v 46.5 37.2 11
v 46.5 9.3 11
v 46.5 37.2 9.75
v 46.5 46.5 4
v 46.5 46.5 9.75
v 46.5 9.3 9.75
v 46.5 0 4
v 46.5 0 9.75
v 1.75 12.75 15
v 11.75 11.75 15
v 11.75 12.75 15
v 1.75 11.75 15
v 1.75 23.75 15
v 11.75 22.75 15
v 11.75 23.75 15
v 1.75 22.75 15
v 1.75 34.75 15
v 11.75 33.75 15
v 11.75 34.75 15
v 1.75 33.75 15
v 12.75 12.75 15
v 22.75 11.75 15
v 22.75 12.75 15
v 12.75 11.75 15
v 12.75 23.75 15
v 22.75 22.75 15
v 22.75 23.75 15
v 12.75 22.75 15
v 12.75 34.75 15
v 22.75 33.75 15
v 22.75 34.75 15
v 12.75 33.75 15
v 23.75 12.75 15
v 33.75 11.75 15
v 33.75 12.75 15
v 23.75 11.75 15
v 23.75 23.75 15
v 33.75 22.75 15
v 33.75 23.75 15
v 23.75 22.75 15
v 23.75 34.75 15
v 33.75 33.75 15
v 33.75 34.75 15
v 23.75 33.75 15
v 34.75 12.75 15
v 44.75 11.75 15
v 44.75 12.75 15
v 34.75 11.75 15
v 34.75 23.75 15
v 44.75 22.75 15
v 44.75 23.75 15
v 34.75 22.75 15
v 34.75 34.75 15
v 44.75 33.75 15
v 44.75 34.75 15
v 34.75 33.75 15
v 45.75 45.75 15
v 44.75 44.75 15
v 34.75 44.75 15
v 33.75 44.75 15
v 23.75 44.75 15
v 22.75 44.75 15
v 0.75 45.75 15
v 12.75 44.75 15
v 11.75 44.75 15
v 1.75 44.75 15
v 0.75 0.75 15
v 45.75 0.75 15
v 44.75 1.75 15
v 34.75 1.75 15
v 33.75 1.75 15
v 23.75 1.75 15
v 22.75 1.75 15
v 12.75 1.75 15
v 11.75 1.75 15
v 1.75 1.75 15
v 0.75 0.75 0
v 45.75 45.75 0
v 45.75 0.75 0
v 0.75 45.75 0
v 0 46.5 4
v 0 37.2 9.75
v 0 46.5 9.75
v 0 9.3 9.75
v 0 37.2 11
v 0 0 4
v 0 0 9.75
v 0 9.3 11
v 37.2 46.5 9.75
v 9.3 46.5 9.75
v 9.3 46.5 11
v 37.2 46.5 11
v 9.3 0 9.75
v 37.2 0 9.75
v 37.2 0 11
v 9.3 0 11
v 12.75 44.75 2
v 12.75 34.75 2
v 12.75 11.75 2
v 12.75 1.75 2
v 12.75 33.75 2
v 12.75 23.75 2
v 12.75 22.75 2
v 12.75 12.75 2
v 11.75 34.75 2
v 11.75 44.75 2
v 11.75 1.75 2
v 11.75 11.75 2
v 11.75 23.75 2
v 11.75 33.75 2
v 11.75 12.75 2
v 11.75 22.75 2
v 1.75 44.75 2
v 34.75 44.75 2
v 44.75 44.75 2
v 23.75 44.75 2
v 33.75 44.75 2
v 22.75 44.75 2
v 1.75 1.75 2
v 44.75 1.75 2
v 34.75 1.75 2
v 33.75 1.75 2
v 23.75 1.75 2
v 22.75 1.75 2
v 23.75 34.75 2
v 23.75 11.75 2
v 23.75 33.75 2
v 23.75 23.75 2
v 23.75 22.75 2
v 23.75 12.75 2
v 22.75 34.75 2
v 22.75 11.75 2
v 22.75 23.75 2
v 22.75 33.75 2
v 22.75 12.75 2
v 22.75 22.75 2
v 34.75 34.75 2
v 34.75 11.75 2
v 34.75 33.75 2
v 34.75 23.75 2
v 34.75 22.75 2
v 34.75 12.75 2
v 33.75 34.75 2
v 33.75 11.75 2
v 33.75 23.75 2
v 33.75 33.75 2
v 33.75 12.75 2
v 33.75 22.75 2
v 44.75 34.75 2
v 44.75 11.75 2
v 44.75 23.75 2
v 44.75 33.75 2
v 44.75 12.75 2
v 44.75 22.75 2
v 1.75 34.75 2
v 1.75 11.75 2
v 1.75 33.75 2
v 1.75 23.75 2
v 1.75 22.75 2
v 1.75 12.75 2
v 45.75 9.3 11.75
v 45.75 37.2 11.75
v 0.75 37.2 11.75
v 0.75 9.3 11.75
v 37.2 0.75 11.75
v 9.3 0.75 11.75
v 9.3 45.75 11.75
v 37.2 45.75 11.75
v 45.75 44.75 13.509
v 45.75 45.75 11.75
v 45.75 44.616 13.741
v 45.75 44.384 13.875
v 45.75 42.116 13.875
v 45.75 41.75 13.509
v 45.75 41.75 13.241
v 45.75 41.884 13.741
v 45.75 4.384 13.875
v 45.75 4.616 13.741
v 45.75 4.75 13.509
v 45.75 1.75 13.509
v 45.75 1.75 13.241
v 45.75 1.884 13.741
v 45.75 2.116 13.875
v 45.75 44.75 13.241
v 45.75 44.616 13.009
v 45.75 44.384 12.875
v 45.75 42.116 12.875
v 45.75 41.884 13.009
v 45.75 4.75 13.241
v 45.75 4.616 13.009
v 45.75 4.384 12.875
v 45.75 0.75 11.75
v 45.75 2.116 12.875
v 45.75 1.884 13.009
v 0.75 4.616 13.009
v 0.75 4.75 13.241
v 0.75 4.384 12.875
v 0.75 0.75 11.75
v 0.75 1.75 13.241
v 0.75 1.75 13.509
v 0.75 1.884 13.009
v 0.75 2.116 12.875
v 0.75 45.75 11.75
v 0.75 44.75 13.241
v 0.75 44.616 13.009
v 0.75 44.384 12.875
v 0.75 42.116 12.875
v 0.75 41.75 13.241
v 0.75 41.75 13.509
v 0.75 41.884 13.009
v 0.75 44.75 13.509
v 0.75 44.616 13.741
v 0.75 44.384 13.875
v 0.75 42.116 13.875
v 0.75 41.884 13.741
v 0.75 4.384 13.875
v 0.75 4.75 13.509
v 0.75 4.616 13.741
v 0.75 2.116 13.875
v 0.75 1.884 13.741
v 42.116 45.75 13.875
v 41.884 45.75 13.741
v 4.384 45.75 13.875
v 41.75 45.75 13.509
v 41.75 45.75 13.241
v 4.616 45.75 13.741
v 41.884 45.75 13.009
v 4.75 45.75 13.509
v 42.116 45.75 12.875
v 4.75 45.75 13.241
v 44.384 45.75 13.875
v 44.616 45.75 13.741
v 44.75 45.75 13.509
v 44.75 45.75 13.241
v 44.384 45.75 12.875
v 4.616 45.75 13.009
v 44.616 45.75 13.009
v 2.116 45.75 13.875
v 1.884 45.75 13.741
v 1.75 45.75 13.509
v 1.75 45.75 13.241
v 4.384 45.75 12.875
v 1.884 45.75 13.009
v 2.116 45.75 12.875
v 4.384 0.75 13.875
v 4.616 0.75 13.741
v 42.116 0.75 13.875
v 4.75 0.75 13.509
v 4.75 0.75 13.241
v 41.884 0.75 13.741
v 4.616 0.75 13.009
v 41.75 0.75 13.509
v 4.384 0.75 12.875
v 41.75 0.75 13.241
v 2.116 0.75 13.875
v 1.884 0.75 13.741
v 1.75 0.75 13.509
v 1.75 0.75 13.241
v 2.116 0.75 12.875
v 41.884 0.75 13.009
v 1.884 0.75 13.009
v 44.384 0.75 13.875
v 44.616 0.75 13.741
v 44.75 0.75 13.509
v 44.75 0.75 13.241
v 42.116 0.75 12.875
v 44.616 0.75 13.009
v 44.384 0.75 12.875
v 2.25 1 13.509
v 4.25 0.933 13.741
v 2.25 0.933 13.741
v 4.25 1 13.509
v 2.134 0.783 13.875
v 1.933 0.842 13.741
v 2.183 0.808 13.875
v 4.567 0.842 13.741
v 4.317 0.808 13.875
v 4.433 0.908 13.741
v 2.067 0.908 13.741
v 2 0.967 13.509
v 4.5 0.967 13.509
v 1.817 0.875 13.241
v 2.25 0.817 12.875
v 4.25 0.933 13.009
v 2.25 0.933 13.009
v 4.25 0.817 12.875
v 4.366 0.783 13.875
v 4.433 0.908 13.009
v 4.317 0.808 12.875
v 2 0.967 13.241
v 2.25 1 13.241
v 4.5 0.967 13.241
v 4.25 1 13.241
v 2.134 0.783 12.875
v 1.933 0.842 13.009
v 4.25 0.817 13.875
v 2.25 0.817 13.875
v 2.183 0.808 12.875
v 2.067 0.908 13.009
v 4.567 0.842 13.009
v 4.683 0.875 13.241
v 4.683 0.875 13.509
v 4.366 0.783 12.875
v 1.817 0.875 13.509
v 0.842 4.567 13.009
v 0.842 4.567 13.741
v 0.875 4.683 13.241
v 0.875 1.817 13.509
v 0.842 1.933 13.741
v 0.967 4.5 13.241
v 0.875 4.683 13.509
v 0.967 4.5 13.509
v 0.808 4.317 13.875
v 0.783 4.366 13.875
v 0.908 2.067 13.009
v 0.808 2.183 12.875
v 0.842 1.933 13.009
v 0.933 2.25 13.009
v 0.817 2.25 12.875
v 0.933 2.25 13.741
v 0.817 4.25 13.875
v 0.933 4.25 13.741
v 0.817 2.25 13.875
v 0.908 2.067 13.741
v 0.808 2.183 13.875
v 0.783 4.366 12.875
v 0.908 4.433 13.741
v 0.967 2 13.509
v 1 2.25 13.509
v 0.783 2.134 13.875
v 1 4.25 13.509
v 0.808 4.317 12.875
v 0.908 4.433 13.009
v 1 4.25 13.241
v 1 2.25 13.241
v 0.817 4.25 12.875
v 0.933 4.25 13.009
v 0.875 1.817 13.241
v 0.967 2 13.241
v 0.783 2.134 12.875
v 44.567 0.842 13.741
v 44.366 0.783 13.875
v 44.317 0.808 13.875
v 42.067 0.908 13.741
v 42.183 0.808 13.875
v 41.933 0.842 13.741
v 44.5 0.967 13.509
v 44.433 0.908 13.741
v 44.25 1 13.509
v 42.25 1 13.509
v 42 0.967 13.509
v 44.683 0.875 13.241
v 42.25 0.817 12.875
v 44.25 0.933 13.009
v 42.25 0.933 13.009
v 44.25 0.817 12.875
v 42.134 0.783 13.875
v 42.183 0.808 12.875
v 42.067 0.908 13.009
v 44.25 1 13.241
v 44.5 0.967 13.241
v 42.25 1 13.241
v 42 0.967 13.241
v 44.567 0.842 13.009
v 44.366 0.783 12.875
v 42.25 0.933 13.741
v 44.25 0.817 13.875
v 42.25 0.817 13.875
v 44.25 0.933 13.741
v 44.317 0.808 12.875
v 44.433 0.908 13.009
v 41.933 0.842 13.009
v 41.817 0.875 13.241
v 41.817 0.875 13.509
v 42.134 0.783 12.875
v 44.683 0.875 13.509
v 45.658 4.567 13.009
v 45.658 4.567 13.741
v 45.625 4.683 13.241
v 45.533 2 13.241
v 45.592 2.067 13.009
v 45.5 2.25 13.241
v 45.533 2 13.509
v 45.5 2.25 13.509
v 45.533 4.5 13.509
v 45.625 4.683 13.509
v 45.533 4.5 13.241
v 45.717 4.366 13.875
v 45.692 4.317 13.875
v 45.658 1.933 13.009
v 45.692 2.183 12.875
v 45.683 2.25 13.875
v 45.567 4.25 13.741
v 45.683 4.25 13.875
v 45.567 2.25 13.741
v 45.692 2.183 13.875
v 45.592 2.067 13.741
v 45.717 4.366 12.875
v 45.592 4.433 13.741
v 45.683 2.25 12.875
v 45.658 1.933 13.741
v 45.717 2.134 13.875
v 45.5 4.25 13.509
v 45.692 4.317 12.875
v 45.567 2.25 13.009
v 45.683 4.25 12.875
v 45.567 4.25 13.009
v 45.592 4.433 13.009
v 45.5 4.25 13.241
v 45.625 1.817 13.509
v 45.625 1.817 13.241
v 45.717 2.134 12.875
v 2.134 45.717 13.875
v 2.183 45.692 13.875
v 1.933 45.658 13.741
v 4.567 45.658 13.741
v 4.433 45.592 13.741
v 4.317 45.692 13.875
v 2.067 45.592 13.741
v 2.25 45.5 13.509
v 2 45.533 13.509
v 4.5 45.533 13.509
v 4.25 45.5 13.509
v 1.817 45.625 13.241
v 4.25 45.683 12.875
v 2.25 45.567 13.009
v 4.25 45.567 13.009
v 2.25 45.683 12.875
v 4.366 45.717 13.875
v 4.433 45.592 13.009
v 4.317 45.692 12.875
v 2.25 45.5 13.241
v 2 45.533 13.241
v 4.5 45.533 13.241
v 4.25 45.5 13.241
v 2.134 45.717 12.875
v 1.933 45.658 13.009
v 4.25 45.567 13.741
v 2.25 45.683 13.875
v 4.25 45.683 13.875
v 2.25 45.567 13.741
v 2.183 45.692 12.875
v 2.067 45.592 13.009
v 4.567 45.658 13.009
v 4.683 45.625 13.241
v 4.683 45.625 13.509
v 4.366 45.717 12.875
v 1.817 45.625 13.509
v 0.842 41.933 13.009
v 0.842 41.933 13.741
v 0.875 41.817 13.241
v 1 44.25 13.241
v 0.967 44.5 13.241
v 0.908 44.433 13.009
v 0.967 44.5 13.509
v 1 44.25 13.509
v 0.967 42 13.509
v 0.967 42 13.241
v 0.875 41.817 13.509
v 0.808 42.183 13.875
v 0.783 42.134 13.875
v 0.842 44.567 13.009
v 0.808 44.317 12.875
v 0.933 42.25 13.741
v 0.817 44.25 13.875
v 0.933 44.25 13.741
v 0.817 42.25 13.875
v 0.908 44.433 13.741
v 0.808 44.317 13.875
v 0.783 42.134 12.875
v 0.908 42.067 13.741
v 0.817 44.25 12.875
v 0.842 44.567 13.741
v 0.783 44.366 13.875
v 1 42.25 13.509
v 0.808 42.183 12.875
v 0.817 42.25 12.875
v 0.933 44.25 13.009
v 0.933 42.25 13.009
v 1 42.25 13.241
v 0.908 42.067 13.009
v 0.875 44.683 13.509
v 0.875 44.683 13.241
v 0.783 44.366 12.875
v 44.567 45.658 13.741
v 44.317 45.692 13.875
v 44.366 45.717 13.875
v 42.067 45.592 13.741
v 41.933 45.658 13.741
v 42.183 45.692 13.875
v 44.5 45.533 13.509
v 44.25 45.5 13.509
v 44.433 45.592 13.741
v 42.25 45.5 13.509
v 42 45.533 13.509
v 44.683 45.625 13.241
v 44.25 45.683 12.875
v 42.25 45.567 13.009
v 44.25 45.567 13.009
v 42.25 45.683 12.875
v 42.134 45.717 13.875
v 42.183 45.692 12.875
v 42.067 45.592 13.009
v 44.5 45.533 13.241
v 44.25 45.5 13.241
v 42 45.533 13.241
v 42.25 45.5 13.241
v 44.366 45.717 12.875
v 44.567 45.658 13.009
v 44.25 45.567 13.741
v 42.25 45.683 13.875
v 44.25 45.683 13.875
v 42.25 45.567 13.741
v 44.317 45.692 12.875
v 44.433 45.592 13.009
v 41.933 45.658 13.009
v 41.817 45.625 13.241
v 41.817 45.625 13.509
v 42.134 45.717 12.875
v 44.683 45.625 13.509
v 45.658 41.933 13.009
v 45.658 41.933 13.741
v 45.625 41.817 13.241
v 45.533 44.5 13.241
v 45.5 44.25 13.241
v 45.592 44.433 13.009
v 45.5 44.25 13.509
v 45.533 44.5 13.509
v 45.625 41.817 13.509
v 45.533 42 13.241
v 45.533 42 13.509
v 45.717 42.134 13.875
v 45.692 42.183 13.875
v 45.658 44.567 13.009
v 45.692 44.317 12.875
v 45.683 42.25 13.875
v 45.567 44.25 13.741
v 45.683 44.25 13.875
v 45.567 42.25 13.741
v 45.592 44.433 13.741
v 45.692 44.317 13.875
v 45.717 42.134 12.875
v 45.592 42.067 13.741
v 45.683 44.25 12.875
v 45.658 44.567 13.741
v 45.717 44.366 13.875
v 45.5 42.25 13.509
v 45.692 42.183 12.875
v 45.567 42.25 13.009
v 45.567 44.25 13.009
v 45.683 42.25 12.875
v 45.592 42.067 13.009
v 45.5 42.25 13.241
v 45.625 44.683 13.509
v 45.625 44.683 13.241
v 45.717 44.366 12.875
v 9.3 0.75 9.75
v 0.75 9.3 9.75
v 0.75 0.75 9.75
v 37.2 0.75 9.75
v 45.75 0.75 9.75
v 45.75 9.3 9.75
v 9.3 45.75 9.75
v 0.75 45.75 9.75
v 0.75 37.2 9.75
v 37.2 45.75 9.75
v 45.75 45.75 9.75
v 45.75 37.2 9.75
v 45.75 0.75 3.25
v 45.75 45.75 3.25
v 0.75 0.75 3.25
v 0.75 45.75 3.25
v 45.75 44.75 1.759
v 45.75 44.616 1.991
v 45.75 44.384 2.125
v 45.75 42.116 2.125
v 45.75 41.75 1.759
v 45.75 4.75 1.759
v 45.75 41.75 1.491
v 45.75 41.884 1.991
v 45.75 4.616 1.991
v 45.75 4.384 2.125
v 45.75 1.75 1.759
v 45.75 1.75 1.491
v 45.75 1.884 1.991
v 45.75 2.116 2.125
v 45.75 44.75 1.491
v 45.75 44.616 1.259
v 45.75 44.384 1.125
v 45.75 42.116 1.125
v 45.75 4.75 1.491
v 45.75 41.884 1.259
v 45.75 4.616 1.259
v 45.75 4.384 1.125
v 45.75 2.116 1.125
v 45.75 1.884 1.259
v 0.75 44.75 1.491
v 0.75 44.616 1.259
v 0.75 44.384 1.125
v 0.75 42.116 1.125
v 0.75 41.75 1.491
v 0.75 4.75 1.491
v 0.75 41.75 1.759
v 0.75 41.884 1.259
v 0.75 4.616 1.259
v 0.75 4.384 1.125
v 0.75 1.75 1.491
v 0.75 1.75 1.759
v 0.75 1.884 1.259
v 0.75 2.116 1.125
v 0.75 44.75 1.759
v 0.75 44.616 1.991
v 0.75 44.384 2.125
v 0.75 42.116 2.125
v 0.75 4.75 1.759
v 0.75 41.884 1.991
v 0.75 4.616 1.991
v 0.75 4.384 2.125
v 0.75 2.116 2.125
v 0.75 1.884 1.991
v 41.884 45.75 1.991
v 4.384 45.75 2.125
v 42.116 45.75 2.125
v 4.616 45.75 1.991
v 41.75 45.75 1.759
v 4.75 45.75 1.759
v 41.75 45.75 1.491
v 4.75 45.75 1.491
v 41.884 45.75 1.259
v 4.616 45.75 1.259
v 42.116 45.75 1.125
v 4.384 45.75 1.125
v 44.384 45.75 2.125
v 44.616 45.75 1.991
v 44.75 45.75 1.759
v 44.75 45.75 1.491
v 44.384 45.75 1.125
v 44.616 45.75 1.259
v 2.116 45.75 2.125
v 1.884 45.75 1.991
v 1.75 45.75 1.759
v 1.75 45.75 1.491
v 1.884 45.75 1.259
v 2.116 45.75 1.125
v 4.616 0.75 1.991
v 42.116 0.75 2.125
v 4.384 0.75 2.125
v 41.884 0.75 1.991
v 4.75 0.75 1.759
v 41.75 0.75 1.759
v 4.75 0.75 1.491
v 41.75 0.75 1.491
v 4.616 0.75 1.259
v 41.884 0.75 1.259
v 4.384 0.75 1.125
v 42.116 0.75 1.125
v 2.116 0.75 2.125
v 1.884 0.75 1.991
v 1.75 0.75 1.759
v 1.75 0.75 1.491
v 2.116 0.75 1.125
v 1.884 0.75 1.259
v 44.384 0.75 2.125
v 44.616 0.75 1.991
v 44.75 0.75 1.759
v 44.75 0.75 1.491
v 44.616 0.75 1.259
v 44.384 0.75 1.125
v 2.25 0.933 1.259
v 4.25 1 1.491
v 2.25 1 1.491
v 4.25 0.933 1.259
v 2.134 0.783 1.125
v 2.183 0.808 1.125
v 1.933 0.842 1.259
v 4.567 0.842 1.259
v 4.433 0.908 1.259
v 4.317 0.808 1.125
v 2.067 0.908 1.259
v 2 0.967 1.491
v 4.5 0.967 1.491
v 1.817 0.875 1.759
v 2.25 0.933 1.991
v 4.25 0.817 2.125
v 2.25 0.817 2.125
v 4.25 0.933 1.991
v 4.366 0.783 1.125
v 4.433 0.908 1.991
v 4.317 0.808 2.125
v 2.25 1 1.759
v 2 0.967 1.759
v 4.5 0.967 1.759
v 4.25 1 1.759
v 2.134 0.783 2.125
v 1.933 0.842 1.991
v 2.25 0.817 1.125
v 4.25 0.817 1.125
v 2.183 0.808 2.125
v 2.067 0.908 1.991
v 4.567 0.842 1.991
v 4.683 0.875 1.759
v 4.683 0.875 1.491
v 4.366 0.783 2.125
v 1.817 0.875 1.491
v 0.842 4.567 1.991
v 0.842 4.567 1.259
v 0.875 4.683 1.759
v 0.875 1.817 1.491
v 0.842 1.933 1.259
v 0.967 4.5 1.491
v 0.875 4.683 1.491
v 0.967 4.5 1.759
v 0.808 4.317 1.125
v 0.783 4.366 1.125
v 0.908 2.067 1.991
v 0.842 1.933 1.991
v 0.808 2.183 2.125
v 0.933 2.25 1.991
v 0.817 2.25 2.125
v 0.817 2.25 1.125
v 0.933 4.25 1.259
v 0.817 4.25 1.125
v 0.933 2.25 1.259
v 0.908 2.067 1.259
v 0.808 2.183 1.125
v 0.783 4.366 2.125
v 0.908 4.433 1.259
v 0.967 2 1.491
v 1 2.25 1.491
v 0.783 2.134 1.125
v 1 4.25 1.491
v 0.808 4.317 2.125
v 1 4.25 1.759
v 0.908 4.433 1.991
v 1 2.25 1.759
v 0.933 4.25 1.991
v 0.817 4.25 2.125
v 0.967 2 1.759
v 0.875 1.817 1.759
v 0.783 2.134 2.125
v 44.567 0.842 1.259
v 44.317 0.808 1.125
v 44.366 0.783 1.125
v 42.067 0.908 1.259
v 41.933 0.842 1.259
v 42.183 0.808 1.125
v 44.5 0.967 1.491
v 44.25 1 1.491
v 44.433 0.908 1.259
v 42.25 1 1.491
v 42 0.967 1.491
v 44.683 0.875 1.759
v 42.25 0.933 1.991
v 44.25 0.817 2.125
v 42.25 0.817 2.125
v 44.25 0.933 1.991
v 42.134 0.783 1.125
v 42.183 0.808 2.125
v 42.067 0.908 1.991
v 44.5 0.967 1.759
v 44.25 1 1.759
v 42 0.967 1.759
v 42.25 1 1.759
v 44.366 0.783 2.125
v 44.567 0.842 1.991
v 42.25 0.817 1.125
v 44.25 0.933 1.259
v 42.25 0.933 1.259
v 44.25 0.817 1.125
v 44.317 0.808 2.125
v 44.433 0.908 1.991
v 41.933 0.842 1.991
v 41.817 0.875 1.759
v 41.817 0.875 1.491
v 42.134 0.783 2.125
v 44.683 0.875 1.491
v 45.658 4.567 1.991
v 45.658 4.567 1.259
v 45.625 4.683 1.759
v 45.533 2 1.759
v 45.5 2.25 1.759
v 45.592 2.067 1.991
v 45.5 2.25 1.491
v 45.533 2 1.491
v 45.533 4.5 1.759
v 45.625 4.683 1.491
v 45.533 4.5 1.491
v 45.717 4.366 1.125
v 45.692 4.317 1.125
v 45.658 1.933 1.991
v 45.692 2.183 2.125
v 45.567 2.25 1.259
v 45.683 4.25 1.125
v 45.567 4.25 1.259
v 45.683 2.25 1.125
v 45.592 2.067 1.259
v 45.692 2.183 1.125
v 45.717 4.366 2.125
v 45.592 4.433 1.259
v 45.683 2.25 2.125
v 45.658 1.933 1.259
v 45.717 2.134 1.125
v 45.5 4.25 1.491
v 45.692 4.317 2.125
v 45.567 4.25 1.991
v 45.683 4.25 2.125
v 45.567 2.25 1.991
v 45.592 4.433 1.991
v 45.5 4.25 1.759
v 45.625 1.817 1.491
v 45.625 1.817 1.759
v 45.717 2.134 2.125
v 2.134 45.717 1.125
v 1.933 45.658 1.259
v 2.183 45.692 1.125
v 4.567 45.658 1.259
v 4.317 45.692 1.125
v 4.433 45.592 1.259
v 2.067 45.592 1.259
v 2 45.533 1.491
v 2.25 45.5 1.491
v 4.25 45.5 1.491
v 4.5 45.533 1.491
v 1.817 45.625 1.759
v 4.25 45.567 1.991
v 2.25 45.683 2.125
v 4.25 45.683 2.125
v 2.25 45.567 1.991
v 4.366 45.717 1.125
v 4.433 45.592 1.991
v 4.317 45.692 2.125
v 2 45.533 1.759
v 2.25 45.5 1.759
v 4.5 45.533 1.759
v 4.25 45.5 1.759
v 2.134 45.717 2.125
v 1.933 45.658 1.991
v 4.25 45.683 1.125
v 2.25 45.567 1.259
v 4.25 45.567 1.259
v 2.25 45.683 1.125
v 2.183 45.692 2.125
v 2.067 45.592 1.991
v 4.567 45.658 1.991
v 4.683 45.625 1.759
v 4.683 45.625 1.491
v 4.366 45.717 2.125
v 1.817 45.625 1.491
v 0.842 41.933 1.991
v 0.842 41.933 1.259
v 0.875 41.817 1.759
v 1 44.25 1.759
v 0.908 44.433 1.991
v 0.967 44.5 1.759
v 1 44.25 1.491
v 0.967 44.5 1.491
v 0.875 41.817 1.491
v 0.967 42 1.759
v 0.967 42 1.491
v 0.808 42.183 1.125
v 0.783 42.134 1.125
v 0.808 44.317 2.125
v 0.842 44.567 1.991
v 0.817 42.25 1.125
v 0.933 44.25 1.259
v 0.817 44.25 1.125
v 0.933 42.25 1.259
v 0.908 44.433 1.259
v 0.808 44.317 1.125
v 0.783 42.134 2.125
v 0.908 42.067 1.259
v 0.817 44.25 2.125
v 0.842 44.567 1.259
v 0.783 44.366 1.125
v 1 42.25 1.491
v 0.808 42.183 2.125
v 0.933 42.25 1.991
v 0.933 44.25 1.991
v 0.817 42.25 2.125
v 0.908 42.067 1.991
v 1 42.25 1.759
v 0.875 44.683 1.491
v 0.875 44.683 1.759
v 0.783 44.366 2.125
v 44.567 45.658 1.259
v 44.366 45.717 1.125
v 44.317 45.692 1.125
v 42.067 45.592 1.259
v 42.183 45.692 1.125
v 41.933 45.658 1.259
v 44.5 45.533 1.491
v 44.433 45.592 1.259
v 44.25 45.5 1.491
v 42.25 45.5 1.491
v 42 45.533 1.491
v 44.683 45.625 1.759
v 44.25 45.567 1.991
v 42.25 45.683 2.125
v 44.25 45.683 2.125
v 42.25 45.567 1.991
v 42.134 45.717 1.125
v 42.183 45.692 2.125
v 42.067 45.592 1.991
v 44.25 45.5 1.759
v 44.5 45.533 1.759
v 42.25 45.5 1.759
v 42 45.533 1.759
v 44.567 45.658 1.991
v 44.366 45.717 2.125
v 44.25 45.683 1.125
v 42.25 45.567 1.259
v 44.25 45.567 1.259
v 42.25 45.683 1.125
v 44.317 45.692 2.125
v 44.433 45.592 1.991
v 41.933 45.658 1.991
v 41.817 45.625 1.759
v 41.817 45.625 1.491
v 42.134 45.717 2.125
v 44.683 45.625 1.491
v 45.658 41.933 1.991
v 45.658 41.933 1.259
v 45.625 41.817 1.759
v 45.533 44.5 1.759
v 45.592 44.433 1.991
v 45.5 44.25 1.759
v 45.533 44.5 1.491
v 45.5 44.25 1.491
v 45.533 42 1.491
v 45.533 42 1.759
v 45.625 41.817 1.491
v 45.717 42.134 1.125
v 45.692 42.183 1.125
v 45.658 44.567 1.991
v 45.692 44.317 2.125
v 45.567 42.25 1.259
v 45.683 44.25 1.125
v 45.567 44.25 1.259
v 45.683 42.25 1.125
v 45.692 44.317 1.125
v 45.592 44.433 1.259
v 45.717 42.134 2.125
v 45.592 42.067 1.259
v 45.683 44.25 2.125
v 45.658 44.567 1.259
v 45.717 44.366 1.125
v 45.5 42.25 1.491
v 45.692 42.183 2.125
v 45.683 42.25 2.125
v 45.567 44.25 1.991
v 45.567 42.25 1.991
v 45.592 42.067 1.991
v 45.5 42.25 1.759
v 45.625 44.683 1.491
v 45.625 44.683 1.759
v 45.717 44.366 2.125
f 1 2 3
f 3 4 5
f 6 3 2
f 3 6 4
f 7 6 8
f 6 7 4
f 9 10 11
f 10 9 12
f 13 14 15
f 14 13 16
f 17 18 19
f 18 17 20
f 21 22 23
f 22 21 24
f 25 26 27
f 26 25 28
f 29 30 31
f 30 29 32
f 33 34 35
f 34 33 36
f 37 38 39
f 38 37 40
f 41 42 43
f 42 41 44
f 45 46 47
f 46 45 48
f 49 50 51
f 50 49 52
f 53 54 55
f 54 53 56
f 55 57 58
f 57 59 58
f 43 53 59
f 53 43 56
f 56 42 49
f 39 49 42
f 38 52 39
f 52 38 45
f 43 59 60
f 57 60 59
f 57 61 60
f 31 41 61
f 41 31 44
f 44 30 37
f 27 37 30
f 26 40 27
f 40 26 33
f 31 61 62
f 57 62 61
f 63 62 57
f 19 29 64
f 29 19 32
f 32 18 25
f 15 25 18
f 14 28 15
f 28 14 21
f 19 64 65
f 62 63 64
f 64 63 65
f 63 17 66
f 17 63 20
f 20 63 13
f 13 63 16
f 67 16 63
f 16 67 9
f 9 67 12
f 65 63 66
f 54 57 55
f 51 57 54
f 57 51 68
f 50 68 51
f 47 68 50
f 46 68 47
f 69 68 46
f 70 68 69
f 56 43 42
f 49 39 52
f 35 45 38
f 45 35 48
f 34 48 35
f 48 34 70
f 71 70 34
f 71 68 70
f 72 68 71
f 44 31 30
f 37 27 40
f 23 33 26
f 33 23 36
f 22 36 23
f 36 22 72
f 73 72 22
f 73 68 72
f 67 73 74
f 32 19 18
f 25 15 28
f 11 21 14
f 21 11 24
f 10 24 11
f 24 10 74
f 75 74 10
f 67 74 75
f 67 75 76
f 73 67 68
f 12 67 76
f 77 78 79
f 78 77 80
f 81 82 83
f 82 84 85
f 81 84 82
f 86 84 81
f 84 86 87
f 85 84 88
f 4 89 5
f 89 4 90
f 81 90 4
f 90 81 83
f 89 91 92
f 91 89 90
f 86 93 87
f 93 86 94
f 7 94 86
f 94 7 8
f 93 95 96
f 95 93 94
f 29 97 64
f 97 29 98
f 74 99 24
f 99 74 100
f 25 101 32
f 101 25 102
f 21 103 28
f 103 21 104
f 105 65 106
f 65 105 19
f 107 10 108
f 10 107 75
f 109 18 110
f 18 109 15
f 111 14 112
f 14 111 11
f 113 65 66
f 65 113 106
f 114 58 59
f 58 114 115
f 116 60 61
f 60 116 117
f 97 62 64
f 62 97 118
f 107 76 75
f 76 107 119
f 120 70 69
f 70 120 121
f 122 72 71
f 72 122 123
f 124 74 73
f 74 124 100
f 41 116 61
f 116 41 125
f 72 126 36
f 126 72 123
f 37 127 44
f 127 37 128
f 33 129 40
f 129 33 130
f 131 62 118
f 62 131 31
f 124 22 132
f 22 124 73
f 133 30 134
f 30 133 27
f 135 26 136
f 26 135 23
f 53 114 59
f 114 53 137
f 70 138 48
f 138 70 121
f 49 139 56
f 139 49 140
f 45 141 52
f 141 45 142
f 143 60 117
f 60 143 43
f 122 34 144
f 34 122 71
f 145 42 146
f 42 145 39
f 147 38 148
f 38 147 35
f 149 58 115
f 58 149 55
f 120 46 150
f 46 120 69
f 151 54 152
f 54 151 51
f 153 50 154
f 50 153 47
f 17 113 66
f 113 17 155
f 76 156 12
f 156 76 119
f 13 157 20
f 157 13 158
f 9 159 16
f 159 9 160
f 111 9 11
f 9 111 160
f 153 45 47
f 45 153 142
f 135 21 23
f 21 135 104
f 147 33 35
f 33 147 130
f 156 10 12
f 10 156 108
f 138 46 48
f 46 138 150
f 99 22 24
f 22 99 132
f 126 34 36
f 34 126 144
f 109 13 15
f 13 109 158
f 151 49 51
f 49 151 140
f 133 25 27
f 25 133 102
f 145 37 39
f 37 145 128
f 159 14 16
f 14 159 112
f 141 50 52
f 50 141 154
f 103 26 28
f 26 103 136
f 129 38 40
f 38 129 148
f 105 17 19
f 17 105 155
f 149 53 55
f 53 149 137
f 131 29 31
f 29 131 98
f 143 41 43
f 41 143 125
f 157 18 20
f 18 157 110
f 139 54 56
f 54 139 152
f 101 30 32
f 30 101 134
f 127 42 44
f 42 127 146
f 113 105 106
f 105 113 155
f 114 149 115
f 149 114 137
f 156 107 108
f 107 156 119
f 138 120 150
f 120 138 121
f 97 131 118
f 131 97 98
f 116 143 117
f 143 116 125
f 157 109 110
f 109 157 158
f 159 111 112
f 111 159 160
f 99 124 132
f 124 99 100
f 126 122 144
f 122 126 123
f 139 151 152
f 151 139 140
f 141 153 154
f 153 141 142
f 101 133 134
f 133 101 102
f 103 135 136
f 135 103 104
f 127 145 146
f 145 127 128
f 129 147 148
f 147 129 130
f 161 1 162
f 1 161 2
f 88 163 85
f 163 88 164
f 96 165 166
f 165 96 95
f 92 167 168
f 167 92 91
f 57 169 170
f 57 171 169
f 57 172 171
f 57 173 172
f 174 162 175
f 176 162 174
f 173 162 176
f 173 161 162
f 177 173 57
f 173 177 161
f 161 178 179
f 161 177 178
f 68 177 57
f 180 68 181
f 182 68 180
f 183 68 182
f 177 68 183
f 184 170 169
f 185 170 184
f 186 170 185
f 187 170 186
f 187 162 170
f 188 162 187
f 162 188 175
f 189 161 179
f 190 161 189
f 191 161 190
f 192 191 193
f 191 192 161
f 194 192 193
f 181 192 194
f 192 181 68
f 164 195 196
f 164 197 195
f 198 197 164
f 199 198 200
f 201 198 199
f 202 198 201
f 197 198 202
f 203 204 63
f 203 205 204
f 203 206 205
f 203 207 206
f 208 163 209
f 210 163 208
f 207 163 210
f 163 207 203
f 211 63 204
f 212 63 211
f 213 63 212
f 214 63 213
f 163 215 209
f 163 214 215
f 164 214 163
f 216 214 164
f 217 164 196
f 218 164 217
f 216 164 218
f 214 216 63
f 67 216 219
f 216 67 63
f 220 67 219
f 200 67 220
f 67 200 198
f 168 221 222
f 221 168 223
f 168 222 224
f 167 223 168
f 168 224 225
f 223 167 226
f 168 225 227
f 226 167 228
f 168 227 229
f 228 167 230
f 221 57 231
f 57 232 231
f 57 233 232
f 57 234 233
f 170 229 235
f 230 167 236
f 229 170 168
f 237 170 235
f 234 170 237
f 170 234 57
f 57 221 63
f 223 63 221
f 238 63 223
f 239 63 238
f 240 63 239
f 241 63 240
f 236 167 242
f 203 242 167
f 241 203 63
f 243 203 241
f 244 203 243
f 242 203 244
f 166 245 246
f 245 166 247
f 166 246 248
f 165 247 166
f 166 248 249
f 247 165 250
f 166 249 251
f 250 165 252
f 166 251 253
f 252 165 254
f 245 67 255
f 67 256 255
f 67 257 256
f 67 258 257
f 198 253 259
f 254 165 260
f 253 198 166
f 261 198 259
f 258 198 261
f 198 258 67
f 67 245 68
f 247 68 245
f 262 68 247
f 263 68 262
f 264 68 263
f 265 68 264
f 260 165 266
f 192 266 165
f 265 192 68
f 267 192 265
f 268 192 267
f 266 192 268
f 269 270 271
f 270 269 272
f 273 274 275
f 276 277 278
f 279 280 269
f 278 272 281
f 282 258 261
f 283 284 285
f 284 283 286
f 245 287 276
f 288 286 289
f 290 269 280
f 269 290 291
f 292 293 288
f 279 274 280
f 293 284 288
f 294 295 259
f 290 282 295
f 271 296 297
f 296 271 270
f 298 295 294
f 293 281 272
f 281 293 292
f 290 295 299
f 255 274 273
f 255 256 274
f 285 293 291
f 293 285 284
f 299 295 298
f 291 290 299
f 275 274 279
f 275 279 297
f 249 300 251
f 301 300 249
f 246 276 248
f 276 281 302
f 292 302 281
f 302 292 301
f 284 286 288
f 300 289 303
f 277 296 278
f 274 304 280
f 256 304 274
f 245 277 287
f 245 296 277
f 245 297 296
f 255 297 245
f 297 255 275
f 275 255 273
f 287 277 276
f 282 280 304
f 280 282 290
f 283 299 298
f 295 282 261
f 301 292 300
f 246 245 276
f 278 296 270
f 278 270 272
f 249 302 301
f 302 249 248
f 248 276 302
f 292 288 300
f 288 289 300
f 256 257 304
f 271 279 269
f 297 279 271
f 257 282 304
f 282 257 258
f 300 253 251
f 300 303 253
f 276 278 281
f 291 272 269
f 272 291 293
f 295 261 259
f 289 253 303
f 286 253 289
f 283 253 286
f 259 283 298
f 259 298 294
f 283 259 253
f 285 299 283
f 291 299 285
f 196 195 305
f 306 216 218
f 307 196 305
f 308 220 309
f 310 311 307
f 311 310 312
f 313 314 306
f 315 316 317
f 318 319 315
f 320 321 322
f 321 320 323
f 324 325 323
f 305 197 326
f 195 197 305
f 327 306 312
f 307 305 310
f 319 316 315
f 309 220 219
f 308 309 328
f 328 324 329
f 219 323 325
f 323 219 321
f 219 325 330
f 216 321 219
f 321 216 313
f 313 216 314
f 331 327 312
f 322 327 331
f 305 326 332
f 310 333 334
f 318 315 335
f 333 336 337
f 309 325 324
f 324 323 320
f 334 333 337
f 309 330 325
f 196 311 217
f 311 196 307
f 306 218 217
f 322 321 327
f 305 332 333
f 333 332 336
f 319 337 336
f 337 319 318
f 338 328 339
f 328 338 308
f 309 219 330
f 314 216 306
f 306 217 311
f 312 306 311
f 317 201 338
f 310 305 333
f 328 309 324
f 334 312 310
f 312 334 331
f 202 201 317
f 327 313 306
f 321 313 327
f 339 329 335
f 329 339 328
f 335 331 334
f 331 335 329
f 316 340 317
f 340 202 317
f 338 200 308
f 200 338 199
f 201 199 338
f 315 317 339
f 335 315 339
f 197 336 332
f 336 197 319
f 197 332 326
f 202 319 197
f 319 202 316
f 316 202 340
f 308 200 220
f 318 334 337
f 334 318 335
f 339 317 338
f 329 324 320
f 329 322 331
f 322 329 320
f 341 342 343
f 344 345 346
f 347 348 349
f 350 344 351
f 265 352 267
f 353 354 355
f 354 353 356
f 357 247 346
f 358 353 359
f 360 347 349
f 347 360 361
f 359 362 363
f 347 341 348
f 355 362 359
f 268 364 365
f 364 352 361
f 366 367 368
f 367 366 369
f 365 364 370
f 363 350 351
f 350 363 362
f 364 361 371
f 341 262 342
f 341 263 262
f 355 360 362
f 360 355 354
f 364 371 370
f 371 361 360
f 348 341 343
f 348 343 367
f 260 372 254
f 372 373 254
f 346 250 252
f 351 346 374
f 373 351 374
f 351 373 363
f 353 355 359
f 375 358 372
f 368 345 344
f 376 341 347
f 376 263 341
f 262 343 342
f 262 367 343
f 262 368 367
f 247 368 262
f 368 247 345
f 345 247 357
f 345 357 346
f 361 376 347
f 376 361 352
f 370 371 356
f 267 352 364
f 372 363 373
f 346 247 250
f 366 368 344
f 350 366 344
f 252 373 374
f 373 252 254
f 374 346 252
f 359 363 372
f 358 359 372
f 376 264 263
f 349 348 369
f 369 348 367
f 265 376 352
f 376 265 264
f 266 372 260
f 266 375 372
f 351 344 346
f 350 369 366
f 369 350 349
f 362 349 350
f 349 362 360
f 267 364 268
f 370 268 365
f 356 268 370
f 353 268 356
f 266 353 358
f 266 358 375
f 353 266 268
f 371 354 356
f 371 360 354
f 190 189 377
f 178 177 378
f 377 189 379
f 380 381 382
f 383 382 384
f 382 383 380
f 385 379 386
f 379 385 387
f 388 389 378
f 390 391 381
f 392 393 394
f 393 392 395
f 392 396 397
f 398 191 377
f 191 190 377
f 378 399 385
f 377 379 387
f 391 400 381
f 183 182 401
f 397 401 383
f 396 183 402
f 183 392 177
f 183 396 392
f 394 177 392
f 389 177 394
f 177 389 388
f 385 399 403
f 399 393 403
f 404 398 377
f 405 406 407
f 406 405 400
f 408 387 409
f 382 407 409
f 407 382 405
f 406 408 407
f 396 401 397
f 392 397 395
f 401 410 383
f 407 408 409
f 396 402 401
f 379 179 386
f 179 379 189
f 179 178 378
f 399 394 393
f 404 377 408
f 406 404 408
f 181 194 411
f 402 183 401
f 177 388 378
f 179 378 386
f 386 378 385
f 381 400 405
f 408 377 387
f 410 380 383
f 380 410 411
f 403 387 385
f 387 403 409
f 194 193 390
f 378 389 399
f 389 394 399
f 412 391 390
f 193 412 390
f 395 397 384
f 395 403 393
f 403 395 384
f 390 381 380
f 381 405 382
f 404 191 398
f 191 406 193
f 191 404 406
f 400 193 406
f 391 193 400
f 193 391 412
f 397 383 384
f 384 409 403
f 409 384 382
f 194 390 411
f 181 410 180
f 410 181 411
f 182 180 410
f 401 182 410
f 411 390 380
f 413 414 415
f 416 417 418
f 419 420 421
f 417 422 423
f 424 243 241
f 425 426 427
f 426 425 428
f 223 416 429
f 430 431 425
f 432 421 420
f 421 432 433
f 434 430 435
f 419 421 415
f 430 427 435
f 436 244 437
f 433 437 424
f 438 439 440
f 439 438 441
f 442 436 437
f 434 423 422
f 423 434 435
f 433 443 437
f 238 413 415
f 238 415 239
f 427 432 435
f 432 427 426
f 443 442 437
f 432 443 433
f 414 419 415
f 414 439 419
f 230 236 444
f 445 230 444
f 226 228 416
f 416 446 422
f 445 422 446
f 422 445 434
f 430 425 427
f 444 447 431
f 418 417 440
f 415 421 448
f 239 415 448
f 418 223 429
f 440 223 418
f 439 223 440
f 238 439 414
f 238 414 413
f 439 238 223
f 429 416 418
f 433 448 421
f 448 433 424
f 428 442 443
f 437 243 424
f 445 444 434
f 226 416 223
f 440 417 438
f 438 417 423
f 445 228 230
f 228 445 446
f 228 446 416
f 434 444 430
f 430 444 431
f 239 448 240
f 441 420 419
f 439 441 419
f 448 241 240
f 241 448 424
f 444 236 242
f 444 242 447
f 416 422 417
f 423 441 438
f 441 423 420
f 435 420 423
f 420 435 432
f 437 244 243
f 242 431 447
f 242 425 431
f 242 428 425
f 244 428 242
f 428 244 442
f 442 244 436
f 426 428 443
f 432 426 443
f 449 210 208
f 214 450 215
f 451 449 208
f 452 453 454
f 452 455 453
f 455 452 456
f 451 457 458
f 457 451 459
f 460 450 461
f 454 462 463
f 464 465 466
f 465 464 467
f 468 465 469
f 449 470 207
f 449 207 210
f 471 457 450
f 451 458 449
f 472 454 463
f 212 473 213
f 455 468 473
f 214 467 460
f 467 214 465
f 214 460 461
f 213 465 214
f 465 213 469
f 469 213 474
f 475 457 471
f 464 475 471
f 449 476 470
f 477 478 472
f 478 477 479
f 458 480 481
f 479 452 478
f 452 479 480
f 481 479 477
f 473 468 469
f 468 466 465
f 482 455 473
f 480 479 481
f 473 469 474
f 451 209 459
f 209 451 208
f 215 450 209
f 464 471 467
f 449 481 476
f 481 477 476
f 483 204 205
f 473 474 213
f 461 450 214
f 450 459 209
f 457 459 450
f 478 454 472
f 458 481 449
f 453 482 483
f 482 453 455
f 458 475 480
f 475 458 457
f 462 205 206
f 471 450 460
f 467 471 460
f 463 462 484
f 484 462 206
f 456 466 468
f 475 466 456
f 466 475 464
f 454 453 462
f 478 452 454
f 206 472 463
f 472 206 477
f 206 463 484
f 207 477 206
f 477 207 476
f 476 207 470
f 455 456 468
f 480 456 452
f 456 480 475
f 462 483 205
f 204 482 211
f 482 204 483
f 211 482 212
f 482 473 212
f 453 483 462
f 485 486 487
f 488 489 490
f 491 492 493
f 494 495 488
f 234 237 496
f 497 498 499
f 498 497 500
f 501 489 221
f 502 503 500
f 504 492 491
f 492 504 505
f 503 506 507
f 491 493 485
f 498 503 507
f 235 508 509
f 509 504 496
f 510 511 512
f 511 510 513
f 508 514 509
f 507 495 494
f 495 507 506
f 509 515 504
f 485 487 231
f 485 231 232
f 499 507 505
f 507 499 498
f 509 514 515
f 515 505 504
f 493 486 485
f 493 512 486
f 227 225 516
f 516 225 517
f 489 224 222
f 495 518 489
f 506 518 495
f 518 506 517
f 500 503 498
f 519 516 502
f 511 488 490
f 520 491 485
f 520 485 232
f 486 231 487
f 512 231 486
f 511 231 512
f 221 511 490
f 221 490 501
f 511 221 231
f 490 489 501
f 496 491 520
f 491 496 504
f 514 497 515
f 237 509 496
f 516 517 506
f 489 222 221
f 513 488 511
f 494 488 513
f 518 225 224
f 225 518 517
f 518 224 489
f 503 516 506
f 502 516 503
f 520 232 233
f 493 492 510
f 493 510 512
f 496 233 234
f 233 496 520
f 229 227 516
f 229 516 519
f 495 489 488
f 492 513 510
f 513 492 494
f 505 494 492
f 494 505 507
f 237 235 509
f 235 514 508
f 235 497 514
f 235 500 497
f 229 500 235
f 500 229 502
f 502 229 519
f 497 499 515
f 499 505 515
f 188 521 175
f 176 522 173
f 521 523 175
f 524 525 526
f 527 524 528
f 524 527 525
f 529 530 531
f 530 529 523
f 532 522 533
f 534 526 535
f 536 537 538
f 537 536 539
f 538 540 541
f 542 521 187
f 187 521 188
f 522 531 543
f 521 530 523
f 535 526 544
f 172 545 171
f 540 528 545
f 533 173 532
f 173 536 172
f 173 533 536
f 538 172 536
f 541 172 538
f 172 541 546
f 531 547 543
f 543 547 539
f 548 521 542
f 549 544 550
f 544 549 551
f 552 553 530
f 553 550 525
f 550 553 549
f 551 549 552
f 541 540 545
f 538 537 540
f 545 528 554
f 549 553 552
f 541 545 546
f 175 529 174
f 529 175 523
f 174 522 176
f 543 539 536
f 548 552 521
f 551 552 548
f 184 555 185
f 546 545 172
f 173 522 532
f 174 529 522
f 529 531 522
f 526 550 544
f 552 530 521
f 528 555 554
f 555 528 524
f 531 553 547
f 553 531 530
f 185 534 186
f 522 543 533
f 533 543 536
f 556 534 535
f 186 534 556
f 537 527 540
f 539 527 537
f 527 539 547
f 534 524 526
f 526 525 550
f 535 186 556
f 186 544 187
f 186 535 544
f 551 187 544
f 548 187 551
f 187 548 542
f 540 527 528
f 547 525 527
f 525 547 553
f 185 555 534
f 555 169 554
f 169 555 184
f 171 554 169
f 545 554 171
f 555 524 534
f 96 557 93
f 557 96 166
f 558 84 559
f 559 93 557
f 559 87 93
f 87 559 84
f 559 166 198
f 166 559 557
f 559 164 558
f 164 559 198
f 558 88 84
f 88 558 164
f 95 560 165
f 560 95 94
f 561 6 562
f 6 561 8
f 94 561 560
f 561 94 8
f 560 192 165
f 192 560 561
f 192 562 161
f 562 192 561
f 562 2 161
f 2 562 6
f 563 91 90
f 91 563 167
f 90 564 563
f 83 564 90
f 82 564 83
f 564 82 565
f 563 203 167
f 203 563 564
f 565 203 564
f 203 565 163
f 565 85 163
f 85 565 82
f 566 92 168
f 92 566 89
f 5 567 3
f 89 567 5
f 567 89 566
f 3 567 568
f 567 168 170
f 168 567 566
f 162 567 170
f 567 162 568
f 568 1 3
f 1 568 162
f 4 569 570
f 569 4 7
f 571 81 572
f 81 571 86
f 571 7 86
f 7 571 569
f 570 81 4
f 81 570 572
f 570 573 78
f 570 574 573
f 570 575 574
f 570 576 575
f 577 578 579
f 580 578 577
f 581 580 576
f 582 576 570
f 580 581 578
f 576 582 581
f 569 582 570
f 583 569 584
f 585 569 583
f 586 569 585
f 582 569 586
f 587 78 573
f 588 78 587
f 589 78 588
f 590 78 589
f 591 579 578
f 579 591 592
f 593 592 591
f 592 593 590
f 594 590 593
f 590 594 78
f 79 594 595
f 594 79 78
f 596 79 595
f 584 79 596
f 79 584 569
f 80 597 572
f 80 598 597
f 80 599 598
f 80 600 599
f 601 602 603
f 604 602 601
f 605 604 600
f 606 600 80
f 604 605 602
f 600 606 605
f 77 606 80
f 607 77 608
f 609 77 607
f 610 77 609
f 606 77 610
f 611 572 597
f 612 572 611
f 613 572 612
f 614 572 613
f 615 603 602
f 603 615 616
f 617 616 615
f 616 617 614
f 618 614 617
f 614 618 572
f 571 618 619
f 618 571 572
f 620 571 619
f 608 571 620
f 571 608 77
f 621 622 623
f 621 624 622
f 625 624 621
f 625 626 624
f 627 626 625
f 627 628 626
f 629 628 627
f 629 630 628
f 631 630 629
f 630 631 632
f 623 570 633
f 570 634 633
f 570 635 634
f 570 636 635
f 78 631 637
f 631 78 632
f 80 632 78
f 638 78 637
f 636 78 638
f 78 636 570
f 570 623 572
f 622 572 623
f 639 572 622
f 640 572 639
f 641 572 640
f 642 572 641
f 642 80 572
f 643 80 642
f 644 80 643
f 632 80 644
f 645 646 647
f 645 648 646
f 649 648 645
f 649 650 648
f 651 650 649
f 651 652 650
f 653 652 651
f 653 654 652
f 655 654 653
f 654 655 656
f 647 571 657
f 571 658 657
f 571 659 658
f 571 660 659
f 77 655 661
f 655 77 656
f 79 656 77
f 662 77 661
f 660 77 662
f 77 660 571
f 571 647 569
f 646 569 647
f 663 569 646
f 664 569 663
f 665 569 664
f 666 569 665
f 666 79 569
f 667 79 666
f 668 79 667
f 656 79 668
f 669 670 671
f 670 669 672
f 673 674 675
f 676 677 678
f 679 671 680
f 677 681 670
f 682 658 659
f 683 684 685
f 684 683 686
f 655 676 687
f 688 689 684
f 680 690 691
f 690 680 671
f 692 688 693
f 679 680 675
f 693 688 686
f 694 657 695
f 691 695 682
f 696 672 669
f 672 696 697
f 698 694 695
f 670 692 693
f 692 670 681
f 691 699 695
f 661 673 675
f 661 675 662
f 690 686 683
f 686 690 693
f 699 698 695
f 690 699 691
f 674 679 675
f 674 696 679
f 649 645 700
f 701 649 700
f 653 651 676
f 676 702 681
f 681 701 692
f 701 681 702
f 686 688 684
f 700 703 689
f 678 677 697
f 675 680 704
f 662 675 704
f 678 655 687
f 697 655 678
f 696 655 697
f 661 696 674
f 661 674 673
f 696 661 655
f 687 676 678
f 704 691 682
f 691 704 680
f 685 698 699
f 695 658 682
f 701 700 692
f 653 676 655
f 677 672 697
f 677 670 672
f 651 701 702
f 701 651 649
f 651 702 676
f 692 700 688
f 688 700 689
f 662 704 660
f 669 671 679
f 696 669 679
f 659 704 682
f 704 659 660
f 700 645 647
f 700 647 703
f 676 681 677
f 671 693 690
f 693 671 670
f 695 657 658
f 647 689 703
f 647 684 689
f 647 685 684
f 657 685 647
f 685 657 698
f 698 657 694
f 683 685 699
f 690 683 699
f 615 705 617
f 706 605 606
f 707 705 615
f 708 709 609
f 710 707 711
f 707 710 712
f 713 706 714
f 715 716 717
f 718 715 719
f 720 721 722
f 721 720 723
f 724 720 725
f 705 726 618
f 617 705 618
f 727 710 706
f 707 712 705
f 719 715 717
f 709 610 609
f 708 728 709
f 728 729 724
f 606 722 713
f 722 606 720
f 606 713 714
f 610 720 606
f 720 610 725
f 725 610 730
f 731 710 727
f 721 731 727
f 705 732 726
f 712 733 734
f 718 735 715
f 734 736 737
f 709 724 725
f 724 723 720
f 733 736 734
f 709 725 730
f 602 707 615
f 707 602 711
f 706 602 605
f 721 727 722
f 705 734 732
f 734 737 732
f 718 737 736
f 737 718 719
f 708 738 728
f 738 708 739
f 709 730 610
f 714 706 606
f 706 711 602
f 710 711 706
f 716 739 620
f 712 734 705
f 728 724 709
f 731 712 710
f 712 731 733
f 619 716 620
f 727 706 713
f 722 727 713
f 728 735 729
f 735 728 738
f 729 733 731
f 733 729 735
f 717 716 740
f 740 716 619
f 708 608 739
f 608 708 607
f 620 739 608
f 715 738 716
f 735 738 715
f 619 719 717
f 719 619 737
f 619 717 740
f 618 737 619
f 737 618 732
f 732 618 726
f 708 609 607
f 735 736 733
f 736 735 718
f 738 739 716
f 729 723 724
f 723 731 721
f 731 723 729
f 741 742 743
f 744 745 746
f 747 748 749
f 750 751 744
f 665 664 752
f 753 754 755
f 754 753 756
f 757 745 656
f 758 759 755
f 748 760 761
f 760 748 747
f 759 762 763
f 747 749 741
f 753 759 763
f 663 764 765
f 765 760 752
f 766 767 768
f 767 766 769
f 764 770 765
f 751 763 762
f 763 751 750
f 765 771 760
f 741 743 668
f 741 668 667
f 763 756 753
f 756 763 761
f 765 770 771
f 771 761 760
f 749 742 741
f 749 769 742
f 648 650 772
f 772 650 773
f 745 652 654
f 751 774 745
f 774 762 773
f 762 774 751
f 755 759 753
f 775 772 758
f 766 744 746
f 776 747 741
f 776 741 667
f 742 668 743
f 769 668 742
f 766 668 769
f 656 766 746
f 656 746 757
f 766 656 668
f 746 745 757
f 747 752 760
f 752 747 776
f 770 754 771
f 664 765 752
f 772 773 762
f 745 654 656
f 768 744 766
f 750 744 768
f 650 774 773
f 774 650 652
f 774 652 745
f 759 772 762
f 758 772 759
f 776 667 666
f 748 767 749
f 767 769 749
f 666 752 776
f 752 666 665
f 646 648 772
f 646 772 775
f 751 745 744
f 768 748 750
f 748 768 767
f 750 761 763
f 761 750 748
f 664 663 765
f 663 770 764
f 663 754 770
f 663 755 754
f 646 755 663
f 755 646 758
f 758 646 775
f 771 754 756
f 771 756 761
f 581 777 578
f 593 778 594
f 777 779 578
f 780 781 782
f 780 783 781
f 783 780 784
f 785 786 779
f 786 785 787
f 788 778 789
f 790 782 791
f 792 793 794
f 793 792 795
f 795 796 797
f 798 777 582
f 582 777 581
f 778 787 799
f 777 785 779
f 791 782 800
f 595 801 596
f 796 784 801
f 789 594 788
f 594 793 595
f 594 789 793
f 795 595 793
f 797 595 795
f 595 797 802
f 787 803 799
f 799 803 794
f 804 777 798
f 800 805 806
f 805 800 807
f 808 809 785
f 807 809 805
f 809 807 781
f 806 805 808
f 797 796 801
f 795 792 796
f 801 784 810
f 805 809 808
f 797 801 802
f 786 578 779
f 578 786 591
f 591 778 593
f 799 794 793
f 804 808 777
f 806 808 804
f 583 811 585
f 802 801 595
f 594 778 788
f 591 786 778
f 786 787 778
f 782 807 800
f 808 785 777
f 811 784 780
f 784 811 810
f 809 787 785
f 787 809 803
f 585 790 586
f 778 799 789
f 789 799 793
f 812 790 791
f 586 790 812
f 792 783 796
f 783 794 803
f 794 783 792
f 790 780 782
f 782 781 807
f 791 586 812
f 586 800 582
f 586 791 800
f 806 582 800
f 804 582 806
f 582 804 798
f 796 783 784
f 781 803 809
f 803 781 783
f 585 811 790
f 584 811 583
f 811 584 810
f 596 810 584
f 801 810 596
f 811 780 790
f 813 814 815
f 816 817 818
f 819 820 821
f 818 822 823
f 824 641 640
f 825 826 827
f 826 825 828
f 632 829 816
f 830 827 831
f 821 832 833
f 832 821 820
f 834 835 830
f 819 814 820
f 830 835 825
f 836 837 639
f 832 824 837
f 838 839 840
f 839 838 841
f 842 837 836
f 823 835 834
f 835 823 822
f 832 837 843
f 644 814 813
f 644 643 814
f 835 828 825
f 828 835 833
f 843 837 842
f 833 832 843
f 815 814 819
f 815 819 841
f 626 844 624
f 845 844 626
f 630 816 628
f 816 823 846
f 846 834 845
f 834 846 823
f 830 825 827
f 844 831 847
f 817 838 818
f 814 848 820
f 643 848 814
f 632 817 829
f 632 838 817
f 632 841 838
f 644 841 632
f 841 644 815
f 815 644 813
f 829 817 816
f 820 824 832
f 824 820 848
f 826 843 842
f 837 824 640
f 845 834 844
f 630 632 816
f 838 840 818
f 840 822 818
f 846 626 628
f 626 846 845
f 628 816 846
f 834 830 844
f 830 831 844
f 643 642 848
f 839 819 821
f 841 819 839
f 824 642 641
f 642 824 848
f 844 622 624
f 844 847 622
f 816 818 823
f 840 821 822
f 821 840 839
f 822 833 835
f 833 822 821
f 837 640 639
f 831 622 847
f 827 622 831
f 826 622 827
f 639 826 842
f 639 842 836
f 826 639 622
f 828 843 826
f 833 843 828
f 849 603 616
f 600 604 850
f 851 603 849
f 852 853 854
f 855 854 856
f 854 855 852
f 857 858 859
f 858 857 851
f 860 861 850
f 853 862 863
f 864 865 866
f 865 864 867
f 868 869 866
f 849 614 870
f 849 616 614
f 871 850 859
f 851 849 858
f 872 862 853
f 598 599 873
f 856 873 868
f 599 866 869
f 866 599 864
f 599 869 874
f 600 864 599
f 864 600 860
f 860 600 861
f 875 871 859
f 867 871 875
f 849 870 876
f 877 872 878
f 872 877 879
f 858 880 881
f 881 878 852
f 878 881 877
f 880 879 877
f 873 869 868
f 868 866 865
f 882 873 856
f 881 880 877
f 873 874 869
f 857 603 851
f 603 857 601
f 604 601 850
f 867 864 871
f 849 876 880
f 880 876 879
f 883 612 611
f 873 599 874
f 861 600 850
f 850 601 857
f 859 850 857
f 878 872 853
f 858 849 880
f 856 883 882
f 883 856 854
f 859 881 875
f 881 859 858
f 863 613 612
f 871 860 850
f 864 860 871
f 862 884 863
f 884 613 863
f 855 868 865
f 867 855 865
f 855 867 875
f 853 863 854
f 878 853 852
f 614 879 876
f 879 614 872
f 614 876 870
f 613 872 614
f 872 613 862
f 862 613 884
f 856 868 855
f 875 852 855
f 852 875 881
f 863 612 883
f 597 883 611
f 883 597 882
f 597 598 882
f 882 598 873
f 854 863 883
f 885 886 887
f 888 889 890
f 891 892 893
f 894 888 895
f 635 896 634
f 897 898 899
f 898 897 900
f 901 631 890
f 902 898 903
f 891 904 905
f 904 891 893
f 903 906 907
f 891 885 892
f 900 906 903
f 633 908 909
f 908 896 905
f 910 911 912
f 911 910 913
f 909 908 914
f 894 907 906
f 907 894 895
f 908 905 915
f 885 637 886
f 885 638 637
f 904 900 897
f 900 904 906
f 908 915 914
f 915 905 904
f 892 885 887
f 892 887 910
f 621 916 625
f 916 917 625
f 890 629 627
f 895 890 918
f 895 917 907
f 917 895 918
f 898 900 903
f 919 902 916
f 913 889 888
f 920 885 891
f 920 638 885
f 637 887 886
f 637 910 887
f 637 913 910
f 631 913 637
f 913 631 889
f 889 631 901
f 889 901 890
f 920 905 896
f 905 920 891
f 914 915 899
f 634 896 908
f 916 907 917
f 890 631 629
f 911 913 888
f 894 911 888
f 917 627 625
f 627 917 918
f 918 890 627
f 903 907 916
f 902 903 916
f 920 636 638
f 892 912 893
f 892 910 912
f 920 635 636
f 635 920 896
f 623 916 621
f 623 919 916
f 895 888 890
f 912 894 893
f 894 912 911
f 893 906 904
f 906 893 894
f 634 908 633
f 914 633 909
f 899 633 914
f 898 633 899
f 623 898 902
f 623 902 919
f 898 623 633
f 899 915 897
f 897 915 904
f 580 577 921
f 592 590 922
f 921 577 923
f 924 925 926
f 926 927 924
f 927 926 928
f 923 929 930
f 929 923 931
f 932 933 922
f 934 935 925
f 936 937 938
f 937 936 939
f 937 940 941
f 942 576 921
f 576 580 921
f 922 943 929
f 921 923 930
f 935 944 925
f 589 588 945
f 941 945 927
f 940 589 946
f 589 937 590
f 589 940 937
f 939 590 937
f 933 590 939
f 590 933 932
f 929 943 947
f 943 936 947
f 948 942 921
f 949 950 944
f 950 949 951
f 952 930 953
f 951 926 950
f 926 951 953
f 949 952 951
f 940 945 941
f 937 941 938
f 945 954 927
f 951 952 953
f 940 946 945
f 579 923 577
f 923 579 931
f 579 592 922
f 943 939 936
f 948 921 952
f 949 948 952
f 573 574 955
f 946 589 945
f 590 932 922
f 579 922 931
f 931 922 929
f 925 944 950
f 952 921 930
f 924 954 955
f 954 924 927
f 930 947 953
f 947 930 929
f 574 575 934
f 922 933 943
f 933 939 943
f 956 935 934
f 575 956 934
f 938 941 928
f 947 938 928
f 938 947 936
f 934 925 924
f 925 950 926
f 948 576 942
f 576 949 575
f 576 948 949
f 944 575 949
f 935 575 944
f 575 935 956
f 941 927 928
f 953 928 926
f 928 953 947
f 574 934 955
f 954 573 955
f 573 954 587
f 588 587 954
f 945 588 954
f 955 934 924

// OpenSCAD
// Test: Absolute minimal box — just BOX_SIZE_XYZ and one compartment
include <../boardgame_insert_toolkit_lib.4.scad>;

g_b_print_lid = false;
g_b_print_box = true;
g_isolated_print_box = "";

data = [
    [ OBJECT_BOX, [
        [ NAME, "minimal" ],
        [ BOX_SIZE_XYZ, [46.5, 46.5, 15.0] ],
        [ BOX_FEATURE, [
            [ FTR_NUM_COMPARTMENTS_XY, [4, 4] ],
            [ FTR_COMPARTMENT_SIZE_XYZ, [10, 10, 13.0] ],
        ]],
    ]],
];
MakeAll();
